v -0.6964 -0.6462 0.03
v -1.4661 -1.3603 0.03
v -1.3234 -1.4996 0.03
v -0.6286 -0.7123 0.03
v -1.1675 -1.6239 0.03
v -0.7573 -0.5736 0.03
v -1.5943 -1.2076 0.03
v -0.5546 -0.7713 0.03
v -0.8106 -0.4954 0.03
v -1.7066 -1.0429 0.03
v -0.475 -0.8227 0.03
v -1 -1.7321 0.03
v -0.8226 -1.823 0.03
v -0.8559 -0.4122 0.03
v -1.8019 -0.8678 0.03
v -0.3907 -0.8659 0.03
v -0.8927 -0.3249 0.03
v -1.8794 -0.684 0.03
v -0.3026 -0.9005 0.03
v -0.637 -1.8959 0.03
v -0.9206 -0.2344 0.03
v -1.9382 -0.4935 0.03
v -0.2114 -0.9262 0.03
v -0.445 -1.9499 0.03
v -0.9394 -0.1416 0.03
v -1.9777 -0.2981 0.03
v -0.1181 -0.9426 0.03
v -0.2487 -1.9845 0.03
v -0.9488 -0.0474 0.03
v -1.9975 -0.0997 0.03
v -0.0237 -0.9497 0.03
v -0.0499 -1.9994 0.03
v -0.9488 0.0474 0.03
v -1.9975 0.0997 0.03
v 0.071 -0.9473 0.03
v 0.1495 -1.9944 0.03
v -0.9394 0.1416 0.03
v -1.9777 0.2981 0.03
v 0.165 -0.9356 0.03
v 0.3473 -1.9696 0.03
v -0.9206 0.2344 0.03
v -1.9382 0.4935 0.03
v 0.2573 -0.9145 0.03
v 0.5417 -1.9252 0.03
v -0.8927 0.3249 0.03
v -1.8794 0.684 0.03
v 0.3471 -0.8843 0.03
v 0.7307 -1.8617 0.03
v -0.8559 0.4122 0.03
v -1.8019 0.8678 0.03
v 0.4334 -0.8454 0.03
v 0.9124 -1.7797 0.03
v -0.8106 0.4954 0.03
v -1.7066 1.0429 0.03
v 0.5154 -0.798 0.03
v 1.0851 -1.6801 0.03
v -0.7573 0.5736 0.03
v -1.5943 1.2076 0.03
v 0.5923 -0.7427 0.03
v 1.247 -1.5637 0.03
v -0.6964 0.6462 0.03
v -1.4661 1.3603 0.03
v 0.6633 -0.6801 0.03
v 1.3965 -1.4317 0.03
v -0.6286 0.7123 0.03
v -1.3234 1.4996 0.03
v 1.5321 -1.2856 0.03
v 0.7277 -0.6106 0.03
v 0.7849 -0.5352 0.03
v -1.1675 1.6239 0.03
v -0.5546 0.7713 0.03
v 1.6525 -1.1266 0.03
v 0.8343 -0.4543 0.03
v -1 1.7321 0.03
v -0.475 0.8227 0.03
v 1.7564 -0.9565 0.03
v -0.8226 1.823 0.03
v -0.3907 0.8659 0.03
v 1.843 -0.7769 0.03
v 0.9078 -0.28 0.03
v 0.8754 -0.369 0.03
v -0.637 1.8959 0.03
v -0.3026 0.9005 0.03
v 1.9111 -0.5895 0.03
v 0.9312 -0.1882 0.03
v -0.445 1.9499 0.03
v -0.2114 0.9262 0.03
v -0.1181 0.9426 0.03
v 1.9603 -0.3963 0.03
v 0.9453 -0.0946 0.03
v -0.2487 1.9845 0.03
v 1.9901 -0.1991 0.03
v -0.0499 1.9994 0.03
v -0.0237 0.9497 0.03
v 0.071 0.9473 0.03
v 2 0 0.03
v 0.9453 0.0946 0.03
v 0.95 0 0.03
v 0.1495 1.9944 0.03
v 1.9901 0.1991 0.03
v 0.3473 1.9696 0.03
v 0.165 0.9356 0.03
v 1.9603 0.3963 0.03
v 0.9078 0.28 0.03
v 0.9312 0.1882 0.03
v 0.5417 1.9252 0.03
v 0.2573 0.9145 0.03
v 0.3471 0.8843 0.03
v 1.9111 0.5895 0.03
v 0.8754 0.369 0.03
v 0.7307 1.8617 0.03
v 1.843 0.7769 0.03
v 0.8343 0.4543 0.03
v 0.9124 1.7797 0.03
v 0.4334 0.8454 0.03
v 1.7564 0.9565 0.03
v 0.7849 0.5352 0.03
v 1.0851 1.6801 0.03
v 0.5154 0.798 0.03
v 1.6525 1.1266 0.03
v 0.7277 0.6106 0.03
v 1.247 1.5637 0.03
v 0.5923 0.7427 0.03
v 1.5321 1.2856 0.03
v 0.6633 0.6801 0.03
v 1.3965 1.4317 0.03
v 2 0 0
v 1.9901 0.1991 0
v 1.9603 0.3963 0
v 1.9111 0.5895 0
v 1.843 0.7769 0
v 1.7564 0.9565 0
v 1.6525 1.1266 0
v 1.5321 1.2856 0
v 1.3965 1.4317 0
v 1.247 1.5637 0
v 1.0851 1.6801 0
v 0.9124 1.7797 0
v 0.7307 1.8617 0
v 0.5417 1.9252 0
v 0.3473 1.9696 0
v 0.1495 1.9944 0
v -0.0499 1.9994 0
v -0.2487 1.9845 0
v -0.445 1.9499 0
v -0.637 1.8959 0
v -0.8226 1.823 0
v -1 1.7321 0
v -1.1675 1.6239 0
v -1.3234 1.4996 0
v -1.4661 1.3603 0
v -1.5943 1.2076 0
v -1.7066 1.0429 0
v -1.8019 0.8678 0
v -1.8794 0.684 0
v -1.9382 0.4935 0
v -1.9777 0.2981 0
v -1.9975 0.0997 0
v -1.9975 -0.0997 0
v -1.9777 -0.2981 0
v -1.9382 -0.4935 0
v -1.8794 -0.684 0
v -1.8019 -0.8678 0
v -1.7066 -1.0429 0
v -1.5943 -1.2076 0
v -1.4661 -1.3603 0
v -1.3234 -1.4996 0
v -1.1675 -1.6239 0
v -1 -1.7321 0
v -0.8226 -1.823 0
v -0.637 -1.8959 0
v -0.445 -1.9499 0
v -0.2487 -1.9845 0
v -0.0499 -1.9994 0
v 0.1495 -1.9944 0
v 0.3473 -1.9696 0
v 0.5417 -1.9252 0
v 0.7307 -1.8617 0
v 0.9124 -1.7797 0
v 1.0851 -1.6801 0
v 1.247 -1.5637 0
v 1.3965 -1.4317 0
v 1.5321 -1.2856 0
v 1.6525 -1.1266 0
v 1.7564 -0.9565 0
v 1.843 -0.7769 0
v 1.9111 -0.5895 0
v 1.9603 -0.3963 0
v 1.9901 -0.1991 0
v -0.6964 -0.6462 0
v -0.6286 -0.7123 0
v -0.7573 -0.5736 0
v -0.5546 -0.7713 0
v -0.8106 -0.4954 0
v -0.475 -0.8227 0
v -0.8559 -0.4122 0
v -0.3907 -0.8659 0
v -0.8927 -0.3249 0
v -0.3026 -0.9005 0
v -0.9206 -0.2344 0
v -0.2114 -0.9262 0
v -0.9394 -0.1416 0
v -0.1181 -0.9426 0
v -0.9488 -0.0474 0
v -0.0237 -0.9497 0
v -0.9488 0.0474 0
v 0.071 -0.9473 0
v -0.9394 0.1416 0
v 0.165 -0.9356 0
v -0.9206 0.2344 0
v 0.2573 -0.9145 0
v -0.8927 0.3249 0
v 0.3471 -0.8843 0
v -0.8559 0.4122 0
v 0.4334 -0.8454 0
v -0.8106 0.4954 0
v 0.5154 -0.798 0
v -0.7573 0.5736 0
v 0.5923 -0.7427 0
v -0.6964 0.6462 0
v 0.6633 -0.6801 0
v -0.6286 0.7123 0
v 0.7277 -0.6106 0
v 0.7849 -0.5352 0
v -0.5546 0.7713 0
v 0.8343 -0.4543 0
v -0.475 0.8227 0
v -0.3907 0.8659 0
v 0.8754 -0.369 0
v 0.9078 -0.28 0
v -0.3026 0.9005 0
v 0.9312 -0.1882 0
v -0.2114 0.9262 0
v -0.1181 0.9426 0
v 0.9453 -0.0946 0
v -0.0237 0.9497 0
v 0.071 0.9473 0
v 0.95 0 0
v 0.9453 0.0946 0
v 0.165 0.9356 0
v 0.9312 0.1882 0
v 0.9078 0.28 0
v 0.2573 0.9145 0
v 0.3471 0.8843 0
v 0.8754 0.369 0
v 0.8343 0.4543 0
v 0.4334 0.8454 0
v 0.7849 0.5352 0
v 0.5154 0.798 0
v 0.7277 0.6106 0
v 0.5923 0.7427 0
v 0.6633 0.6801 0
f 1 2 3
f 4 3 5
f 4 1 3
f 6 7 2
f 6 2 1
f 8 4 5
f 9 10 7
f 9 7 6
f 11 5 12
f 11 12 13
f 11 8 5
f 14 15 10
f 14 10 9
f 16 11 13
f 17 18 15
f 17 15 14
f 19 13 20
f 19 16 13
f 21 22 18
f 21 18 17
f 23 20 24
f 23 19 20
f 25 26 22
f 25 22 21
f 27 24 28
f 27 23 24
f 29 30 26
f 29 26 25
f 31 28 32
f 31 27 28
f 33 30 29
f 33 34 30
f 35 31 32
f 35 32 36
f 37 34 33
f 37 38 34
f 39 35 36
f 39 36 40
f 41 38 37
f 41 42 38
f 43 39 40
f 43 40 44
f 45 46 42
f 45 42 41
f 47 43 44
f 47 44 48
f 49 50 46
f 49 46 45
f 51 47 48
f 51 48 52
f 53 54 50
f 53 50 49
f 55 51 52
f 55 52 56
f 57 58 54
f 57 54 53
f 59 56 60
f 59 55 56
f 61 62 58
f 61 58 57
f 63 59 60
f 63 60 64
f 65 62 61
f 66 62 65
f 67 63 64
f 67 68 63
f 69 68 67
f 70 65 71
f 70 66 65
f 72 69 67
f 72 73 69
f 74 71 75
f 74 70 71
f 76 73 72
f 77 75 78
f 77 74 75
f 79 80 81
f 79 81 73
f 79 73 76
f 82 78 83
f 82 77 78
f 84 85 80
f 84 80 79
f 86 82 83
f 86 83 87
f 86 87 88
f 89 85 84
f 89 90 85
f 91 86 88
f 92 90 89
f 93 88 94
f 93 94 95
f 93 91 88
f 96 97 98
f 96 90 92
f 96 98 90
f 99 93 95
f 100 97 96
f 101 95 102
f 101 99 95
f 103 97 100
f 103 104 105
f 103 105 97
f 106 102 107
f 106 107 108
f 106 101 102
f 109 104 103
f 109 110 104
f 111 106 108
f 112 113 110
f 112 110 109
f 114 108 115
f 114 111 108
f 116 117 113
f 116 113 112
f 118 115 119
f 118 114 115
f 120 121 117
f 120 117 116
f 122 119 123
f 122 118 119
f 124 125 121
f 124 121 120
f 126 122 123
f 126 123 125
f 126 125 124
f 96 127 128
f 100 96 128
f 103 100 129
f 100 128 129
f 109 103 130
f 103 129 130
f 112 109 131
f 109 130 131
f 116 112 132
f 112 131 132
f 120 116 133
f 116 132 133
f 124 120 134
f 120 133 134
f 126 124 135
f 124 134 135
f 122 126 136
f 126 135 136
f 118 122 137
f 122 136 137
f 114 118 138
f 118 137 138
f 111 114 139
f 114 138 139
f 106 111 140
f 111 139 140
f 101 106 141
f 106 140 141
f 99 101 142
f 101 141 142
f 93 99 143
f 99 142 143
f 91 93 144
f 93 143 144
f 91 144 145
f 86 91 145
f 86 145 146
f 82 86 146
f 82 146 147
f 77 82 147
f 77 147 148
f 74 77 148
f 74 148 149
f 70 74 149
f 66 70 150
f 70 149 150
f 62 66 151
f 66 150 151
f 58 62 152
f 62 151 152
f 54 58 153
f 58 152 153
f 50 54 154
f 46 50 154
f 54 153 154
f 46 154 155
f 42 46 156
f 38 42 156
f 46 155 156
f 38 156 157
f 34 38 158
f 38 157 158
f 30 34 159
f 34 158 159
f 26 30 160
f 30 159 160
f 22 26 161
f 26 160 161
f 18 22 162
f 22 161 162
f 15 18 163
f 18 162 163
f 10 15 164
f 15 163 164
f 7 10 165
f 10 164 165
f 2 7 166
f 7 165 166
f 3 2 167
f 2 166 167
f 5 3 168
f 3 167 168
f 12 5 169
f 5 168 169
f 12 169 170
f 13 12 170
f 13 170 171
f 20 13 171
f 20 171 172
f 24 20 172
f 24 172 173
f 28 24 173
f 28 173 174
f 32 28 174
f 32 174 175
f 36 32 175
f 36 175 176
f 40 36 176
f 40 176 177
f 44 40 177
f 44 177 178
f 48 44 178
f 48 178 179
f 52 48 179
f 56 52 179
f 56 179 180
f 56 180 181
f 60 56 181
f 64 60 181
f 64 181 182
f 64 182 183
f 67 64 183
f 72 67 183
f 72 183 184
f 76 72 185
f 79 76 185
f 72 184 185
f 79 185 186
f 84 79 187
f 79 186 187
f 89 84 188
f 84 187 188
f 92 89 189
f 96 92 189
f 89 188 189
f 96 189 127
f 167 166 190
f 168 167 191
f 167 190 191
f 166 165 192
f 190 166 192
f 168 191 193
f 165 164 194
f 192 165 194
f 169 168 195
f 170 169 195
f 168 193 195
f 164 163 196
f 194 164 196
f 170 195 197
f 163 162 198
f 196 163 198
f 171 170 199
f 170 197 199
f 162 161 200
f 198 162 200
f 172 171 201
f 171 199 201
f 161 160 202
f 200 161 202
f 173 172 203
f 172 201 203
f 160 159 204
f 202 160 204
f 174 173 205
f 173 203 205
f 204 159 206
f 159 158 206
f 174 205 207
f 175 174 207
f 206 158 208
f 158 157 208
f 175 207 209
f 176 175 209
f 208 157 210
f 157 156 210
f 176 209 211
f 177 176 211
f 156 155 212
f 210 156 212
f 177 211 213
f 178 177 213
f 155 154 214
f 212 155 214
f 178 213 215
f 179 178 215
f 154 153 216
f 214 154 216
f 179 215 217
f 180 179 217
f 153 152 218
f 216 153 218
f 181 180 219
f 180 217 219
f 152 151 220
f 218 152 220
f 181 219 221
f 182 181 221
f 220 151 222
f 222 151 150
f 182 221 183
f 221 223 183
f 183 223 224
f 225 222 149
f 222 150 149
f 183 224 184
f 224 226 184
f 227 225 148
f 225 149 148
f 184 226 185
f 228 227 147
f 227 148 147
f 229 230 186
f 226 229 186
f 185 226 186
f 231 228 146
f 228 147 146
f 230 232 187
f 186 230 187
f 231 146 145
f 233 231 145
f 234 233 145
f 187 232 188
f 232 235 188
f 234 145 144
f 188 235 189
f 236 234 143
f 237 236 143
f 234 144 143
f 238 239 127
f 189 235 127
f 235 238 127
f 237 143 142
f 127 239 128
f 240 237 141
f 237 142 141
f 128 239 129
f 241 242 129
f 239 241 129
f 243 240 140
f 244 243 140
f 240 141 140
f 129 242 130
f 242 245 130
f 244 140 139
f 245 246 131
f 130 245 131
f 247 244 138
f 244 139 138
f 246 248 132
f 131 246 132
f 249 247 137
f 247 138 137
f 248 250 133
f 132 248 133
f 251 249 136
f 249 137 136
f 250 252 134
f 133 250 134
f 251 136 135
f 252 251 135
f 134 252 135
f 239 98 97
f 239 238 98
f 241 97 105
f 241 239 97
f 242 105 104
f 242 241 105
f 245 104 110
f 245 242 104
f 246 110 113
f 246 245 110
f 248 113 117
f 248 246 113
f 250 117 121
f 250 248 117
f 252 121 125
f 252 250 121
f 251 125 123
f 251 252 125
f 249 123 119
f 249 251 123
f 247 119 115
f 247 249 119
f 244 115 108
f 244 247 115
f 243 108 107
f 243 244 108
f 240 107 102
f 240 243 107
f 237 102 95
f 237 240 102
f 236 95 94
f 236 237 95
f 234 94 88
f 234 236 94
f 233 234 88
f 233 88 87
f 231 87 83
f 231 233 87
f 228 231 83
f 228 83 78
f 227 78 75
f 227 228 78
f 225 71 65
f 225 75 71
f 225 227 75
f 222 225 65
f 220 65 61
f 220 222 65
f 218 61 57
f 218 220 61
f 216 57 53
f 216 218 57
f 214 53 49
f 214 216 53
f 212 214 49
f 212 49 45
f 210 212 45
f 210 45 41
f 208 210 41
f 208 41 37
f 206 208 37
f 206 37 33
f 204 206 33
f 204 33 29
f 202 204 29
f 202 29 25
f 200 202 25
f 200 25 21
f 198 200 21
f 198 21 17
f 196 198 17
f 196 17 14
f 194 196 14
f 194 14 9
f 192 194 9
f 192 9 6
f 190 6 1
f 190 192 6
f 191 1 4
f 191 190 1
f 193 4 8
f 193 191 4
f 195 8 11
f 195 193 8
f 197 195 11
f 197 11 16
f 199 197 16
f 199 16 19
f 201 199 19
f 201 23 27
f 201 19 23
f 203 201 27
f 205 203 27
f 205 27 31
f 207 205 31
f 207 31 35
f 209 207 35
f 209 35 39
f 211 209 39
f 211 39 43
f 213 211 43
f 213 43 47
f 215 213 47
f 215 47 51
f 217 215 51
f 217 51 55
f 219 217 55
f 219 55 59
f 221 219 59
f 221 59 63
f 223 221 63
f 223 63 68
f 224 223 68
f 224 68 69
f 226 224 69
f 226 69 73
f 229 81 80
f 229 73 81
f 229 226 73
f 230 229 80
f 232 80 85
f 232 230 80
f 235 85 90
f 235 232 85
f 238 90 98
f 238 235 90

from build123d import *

# Parameters (mm, degrees)
CYLINDER001_R     = 0.95
CYLINDER001_DEPTH = 1
CYLINDER_R        = 2
CYLINDER_DEPTH    = 0.03


with BuildPart() as drill190:
    # Cylinder001 → Cylinder001 (new body)
    with BuildSketch(Plane.XY.offset(-0.5)):
        Circle(CYLINDER001_R)
    extrude(amount=CYLINDER001_DEPTH)


with BuildPart() as tp400p190d:
    # Cylinder → Cylinder (new body)
    with BuildSketch(Plane.XY):
        Circle(CYLINDER_R)
    extrude(amount=CYLINDER_DEPTH)

    # Cut: cut drill190
    add(drill190.part, mode=Mode.SUBTRACT)


solid = tp400p190d.part
